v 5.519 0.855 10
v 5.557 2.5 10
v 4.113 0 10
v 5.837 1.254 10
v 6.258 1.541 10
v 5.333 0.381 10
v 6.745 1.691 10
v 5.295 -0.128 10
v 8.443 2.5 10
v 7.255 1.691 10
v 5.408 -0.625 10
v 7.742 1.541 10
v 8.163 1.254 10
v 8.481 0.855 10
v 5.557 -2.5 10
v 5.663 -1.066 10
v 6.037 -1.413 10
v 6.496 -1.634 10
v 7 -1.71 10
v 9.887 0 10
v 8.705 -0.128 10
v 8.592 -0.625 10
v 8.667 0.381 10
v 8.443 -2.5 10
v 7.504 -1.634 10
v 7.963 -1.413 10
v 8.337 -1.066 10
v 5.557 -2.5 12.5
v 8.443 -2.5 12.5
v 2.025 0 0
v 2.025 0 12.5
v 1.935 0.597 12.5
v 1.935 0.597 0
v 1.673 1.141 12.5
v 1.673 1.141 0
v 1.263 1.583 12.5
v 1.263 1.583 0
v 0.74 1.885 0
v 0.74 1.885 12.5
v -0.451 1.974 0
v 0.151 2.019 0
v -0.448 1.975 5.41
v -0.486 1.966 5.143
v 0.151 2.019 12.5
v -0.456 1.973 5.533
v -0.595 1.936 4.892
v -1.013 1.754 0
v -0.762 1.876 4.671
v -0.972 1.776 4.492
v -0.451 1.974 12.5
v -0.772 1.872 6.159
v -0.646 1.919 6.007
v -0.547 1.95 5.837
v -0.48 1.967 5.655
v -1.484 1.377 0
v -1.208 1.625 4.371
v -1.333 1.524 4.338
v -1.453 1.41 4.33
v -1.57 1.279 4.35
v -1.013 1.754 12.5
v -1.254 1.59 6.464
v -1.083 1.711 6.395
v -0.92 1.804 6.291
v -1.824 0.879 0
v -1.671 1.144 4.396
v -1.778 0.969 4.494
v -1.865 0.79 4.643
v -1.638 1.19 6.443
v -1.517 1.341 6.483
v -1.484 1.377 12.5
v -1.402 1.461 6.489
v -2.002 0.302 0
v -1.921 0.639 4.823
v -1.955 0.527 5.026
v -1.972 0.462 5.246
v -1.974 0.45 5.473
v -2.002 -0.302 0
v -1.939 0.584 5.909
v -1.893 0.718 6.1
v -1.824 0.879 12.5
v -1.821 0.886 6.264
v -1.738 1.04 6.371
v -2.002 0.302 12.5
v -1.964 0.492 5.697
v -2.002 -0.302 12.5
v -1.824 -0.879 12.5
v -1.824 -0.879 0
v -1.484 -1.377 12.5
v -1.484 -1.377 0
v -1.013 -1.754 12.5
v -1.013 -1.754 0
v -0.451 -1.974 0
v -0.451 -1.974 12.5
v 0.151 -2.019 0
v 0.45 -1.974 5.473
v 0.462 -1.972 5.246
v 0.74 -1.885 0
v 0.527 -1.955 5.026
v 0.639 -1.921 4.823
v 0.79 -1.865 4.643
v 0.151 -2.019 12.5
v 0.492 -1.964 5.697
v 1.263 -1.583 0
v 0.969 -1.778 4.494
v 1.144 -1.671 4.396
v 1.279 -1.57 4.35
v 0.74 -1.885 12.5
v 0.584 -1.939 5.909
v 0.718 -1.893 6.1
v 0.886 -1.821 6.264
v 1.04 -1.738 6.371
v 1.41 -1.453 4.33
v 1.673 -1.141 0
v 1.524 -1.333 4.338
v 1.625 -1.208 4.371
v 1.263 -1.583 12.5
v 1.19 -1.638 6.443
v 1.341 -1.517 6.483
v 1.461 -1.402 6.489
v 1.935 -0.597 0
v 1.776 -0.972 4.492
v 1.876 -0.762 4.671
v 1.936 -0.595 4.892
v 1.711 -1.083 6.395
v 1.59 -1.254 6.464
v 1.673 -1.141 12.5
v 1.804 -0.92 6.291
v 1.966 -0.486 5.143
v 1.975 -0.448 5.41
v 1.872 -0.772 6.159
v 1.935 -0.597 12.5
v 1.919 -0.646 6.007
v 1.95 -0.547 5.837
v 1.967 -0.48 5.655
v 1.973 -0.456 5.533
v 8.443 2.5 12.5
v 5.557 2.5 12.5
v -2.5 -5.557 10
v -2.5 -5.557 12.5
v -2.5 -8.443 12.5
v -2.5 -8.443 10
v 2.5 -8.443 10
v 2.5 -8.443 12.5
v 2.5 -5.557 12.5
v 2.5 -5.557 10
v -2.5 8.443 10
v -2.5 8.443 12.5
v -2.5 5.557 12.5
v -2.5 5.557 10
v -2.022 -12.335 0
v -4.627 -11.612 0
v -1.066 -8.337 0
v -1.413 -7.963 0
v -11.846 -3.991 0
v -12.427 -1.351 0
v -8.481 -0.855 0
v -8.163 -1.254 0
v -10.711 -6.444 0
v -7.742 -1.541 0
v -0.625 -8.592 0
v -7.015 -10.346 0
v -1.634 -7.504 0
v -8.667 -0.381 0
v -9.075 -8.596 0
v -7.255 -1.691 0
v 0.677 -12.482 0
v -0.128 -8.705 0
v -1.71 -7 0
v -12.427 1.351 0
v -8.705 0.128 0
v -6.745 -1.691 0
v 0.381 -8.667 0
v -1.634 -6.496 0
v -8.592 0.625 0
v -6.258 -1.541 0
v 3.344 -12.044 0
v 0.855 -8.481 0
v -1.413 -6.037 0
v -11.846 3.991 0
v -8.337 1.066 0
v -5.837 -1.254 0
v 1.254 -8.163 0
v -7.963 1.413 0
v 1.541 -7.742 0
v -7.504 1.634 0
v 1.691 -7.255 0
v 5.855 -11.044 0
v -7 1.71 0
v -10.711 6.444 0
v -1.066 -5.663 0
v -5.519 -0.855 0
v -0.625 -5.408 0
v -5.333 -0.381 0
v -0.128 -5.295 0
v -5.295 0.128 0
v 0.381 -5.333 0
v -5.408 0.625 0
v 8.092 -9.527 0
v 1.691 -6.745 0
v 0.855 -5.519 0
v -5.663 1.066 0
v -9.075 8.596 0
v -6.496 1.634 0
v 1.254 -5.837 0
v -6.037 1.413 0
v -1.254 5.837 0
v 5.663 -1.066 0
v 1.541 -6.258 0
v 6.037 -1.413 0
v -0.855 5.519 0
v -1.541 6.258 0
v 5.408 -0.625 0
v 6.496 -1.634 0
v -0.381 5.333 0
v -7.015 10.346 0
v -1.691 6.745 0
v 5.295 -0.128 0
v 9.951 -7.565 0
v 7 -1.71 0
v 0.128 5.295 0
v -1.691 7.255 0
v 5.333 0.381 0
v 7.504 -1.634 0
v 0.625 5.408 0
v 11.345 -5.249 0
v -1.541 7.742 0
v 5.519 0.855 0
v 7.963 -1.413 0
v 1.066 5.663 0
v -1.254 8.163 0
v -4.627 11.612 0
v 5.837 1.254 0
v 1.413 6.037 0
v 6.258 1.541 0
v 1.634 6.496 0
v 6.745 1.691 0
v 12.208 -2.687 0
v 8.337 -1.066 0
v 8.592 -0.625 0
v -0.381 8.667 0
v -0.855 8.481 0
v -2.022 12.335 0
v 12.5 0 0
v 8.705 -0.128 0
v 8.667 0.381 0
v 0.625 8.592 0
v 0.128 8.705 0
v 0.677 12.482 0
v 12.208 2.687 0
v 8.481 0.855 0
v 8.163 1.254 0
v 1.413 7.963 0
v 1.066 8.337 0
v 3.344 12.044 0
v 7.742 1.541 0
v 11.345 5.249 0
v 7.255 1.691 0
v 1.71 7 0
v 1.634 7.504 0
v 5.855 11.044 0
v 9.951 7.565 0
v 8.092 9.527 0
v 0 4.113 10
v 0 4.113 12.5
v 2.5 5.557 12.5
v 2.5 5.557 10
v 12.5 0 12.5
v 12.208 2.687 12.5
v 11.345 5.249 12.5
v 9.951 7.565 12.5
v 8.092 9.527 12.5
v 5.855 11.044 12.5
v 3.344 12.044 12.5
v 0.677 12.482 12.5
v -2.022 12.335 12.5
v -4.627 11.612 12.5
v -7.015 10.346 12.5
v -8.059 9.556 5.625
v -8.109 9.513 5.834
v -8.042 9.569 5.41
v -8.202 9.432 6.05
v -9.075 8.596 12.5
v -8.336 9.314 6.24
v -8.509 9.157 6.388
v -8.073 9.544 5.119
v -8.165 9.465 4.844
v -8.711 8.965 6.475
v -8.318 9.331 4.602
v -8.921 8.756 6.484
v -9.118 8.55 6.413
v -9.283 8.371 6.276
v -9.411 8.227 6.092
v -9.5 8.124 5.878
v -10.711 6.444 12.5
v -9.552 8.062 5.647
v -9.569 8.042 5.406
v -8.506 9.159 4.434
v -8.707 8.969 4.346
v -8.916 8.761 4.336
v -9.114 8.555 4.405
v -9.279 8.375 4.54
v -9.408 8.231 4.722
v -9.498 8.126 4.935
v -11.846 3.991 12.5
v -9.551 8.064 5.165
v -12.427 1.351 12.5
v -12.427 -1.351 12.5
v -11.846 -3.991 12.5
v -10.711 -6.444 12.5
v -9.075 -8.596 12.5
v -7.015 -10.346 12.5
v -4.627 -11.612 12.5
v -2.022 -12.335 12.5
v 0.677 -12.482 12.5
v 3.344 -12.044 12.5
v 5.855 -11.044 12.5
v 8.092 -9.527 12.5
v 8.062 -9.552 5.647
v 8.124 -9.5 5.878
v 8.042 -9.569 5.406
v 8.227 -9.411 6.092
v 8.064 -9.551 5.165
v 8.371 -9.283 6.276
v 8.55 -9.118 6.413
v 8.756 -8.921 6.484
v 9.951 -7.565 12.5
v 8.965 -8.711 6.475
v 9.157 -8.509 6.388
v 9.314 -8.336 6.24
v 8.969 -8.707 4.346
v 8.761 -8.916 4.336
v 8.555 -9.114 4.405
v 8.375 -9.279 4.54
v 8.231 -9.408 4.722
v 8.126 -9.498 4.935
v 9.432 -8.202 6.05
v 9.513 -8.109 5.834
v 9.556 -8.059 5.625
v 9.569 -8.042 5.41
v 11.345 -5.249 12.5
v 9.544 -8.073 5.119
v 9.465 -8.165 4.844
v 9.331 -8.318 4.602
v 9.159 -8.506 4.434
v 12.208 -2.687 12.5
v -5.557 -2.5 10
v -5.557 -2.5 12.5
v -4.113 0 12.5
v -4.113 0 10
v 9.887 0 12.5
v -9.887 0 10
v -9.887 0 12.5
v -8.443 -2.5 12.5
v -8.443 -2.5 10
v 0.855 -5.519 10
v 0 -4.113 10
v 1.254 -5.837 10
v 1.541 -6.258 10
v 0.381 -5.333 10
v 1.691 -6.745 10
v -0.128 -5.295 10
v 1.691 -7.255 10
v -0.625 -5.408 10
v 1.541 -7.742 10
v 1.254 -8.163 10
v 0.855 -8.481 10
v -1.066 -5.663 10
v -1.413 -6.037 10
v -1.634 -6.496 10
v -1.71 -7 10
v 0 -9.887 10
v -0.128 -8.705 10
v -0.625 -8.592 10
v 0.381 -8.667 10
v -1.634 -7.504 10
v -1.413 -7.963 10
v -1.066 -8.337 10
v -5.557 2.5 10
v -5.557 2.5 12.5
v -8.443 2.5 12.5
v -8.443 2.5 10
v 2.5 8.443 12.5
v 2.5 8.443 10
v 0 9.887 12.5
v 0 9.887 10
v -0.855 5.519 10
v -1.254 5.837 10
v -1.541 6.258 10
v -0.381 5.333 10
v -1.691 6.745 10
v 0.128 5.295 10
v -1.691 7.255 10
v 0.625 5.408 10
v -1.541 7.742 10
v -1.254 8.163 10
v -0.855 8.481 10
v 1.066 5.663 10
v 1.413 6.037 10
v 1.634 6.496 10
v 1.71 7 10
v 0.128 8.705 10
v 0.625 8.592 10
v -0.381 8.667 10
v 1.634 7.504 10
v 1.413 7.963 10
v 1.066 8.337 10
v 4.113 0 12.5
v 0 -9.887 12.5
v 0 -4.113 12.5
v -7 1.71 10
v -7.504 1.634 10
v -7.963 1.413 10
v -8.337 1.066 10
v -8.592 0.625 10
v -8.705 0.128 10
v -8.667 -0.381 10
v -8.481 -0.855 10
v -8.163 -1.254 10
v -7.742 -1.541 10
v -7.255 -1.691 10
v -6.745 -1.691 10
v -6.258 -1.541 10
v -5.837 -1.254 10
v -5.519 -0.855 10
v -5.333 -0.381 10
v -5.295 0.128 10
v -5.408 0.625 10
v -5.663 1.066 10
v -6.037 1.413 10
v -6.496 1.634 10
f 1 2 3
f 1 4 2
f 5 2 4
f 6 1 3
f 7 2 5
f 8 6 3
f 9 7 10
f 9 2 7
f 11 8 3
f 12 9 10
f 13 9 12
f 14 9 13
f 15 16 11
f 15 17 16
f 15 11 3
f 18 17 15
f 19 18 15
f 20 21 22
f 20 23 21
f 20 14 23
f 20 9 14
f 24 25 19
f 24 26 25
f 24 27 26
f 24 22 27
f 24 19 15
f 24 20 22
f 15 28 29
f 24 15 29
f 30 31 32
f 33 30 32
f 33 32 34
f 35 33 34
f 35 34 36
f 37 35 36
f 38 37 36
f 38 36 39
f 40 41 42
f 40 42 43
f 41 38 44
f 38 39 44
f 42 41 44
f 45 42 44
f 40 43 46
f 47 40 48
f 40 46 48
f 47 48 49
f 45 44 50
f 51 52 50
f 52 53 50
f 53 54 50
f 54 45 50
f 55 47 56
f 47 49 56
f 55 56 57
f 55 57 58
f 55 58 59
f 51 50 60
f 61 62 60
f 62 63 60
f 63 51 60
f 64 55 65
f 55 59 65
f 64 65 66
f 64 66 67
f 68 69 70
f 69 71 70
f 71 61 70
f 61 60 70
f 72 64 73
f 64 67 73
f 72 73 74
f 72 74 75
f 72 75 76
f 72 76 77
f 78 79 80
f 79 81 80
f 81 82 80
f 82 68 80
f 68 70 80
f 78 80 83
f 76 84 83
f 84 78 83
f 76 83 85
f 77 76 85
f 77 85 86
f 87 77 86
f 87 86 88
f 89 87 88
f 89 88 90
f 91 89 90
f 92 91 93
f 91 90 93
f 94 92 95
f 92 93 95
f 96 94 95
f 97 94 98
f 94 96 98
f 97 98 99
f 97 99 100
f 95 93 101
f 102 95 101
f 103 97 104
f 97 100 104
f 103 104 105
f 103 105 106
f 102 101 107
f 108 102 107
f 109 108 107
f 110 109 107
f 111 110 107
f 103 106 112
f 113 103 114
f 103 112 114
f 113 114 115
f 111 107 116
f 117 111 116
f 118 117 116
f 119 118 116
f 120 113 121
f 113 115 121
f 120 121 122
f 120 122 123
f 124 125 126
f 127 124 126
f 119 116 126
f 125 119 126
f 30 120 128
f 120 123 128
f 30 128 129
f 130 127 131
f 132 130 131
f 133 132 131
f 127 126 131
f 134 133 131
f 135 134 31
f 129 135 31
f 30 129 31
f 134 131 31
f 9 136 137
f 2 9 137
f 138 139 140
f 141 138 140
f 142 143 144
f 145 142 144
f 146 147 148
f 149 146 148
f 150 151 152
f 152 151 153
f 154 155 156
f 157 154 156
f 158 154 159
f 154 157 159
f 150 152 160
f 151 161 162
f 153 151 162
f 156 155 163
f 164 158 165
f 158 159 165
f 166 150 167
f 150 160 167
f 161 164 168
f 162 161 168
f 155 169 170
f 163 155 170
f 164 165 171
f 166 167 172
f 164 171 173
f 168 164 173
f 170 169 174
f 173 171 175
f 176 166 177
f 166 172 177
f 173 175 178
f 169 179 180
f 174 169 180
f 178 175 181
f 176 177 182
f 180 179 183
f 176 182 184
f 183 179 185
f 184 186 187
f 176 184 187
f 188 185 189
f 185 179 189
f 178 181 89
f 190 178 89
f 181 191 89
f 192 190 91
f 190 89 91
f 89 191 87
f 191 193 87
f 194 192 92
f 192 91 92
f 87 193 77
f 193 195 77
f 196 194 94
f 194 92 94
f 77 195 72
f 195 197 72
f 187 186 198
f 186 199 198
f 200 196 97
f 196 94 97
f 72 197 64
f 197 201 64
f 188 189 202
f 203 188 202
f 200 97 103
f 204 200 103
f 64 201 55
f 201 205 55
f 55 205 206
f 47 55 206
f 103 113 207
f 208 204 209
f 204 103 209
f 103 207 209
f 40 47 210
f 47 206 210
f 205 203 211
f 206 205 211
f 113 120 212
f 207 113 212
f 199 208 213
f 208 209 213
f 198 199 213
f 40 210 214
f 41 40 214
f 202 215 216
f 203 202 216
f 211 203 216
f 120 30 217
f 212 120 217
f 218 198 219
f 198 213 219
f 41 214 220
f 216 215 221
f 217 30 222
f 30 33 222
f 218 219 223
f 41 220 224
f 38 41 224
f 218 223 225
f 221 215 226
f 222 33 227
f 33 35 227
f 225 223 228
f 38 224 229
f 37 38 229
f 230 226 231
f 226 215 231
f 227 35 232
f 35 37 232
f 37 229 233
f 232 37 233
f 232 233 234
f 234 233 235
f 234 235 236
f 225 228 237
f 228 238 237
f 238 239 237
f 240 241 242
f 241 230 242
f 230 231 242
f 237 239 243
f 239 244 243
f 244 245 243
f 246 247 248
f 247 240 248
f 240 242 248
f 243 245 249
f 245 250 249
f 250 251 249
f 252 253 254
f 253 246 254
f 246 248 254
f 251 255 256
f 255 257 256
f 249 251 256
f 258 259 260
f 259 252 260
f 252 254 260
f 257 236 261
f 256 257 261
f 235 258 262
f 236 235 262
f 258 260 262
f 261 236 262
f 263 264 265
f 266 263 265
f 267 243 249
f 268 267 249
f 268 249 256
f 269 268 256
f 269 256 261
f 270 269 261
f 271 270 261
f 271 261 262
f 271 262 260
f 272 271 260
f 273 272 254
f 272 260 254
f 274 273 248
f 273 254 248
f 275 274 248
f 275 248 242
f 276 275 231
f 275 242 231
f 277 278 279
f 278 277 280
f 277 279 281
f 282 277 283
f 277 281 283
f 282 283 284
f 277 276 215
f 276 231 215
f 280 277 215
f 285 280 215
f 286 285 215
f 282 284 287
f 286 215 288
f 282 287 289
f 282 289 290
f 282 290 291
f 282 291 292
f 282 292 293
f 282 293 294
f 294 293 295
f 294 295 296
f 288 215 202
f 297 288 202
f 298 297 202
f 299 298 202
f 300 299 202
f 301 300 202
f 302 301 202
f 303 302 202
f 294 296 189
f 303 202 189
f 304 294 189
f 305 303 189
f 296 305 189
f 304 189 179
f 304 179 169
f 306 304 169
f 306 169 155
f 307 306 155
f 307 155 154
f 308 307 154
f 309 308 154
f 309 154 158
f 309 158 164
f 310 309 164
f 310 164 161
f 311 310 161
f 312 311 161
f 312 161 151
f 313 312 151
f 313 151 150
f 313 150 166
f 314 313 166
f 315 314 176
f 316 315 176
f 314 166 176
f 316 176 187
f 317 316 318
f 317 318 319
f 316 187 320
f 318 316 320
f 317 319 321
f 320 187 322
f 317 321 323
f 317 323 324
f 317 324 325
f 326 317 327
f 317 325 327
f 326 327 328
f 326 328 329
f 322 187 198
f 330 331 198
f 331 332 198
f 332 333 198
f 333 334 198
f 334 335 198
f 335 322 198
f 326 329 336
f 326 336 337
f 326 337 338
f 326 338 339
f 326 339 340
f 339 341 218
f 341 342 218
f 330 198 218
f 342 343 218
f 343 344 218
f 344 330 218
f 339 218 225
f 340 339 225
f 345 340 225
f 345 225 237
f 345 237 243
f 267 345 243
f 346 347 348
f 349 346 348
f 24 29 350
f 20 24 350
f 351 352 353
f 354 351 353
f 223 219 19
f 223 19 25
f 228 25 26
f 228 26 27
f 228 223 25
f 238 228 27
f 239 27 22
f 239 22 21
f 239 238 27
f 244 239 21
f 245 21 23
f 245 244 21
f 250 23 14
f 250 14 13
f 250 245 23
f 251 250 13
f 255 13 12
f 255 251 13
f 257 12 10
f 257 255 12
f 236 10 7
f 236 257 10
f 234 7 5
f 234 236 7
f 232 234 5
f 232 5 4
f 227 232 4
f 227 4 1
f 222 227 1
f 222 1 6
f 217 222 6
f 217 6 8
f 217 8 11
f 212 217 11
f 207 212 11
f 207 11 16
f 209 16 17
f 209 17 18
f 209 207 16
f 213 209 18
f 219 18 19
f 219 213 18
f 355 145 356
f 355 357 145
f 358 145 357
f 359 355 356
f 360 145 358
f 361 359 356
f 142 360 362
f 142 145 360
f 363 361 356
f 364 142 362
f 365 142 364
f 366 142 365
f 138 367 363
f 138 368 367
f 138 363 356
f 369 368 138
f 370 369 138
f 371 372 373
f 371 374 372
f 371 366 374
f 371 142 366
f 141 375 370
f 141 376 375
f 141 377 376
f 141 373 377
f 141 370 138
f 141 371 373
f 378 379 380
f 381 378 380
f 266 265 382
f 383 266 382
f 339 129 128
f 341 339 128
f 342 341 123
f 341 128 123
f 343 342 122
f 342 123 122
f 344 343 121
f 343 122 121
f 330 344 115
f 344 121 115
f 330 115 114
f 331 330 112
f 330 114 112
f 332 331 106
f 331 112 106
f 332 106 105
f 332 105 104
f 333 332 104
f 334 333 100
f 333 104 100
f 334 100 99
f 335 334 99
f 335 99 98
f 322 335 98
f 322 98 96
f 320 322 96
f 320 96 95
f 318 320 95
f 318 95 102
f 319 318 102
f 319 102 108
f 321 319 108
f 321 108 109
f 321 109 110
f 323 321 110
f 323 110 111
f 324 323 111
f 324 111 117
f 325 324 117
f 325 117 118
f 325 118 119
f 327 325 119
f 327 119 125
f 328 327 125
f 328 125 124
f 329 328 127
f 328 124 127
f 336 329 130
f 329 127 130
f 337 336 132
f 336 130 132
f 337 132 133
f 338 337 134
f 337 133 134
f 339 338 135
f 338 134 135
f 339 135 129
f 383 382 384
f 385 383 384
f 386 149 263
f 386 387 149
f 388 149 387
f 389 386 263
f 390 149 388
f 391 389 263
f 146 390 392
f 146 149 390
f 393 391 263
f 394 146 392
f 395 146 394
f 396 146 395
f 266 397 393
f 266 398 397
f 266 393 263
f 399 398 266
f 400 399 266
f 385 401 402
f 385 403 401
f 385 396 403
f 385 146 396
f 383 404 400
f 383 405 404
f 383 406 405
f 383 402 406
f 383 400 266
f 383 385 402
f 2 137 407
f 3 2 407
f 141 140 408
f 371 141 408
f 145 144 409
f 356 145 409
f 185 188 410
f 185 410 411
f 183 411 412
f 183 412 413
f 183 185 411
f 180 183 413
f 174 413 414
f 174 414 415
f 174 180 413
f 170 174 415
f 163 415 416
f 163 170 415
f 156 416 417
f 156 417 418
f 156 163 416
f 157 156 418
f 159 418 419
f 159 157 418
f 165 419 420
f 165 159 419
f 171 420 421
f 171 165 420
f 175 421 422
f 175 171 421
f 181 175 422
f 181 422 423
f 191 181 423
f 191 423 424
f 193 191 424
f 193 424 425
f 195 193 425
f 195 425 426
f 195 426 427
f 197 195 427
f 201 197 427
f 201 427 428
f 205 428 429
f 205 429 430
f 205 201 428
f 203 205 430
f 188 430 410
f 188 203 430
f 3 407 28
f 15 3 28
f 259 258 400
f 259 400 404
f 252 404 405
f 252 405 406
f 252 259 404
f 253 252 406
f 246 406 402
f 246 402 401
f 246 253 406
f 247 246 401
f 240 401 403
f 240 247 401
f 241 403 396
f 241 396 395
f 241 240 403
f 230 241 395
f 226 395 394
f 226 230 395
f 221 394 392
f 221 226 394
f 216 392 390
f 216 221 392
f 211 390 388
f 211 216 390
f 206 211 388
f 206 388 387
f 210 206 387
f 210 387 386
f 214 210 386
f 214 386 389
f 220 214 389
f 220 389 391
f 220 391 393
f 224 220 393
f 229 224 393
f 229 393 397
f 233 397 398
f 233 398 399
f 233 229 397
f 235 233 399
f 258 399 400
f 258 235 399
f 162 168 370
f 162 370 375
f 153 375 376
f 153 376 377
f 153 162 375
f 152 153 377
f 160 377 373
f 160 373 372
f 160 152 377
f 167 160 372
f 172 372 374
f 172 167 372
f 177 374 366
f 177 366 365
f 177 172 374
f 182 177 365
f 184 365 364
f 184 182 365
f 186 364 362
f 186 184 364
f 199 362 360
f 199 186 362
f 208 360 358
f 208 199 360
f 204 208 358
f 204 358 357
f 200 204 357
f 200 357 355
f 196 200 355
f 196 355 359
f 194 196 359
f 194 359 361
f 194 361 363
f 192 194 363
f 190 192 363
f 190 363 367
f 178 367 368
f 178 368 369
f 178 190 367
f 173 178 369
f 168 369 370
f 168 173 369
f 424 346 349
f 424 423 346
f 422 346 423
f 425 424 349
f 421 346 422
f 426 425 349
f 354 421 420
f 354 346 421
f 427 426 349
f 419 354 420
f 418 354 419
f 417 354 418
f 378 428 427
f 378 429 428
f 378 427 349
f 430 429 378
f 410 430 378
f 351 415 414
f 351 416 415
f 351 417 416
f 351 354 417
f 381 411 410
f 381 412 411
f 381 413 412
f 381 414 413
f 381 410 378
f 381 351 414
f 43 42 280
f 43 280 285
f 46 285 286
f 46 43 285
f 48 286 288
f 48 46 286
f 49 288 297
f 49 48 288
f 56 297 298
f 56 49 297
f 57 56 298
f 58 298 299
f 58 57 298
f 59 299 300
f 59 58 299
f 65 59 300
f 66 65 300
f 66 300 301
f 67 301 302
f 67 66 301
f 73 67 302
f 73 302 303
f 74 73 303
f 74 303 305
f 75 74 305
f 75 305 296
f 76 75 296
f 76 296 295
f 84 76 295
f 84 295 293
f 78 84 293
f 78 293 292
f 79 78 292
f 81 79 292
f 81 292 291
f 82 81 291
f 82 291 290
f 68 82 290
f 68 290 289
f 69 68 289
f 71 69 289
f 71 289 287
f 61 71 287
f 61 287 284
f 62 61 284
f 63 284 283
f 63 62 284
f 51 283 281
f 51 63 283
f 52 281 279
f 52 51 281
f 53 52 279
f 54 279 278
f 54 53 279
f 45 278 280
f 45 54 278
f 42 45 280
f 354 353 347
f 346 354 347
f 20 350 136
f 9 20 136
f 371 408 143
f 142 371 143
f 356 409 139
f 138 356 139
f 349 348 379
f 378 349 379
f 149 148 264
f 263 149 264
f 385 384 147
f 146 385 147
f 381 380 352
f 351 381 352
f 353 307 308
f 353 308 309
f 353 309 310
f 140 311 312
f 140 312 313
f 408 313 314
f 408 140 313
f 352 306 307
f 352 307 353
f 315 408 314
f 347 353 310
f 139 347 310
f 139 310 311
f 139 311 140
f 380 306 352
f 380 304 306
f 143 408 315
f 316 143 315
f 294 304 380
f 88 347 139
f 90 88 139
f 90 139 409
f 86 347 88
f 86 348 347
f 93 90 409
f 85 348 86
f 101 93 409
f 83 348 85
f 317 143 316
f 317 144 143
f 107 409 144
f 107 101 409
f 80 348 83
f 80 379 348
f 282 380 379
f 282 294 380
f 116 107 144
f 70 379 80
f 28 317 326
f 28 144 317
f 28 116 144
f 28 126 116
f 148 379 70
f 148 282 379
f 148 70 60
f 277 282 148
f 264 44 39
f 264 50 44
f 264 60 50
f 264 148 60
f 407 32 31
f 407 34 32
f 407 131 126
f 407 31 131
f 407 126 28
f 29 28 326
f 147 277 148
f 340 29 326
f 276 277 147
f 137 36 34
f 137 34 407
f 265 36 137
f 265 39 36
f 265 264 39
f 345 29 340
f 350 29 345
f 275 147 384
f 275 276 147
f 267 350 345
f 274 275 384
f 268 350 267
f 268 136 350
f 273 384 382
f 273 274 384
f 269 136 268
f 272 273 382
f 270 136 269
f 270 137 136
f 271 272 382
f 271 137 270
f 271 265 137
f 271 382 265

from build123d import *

# Parameters (mm, degrees)
SKETCH1_R               = 12.5
BOSS_EXTRUDE1_DEPTH     = 12.5
CUT_EXTRUDE1_DEPTH      = 2.5
CUT_EXTRUDE2_REACH      = 23.651
SKETCH2_3_R             = 1.71
CIRPATTERN1_COUNT       = 4
CUT_EXTRUDE3_REACH      = 23.651
SKETCH3_R               = 2.025
CUT_EXTRUDE5_DEPTH      = 22.650635095
CUT_EXTRUDE5_DEPTH_BACK = 22.650635095
SKETCH6_R               = 1.08


with BuildPart() as part:
    # Sketch1 → Boss-Extrude1 (new body)
    with BuildSketch(Plane.XY):
        Circle(SKETCH1_R)
    extrude(amount=BOSS_EXTRUDE1_DEPTH)

    # Sketch2 → Cut-Extrude1 (cut)
    with BuildSketch(Plane.XY.offset(12.5)):
        Polygon((2.5, 8.443375673), (0, 9.886751346), (-2.5, 8.443375673), (-2.5, 5.556624327), (0, 4.113248654), (2.5, 5.556624327), align=None)
    cut_extrude1 = extrude(amount=-CUT_EXTRUDE1_DEPTH, mode=Mode.SUBTRACT)

    # Sketch2<3> → Cut-Extrude2 (cut, up to next)
    with BuildSketch(Plane.XY.offset(12.5), mode=Mode.PRIVATE) as cut_extrude2_sk1:
        with Locations((0, 7)):
            Circle(SKETCH2_3_R)
    cut_extrude2_tool1 = extrude(cut_extrude2_sk1.sketch, amount=-CUT_EXTRUDE2_REACH, mode=Mode.PRIVATE) & part.part
    cut_extrude2 = cut_extrude2_tool1.solids().sort_by_distance((0, 7, 12.5))[0]
    add(cut_extrude2, mode=Mode.SUBTRACT)

    # CirPattern1: Cut-Extrude1, Cut-Extrude2 ×4 about axis
    cirpattern1_axis = Axis((0, 0, 12.5), (0, 0, -1))
    add([cut_extrude1.rotate(cirpattern1_axis, i * 360 / CIRPATTERN1_COUNT) for i in range(1, CIRPATTERN1_COUNT)], mode=Mode.SUBTRACT)
    add([cut_extrude2.rotate(cirpattern1_axis, i * 360 / CIRPATTERN1_COUNT) for i in range(1, CIRPATTERN1_COUNT)], mode=Mode.SUBTRACT)

    # Sketch3 → Cut-Extrude3 (cut, up to next)
    with BuildSketch(Plane.XY.offset(12.5), mode=Mode.PRIVATE) as cut_extrude3_sk1:
        Circle(SKETCH3_R)
    cut_extrude3_tool1 = extrude(cut_extrude3_sk1.sketch, amount=-CUT_EXTRUDE3_REACH, mode=Mode.PRIVATE) & part.part
    add(cut_extrude3_tool1.solids().sort_by_distance((0, 0, 12.5))[0], mode=Mode.SUBTRACT)

    # Sketch6 → Cut-Extrude5 (cut, two sides: drawn at the far end of the back side and taken through both)
    with BuildSketch(Plane(origin=(0, 0, 0), x_dir=(0.7071067811865477, 0.7071067811865475, 0), z_dir=(-0.7071067811865475, 0.7071067811865477, 0)).offset(-CUT_EXTRUDE5_DEPTH_BACK)):
        with Locations((0, -5.41)):
            Circle(SKETCH6_R)
    extrude(amount=CUT_EXTRUDE5_DEPTH + CUT_EXTRUDE5_DEPTH_BACK, mode=Mode.SUBTRACT)


solid = part.part
